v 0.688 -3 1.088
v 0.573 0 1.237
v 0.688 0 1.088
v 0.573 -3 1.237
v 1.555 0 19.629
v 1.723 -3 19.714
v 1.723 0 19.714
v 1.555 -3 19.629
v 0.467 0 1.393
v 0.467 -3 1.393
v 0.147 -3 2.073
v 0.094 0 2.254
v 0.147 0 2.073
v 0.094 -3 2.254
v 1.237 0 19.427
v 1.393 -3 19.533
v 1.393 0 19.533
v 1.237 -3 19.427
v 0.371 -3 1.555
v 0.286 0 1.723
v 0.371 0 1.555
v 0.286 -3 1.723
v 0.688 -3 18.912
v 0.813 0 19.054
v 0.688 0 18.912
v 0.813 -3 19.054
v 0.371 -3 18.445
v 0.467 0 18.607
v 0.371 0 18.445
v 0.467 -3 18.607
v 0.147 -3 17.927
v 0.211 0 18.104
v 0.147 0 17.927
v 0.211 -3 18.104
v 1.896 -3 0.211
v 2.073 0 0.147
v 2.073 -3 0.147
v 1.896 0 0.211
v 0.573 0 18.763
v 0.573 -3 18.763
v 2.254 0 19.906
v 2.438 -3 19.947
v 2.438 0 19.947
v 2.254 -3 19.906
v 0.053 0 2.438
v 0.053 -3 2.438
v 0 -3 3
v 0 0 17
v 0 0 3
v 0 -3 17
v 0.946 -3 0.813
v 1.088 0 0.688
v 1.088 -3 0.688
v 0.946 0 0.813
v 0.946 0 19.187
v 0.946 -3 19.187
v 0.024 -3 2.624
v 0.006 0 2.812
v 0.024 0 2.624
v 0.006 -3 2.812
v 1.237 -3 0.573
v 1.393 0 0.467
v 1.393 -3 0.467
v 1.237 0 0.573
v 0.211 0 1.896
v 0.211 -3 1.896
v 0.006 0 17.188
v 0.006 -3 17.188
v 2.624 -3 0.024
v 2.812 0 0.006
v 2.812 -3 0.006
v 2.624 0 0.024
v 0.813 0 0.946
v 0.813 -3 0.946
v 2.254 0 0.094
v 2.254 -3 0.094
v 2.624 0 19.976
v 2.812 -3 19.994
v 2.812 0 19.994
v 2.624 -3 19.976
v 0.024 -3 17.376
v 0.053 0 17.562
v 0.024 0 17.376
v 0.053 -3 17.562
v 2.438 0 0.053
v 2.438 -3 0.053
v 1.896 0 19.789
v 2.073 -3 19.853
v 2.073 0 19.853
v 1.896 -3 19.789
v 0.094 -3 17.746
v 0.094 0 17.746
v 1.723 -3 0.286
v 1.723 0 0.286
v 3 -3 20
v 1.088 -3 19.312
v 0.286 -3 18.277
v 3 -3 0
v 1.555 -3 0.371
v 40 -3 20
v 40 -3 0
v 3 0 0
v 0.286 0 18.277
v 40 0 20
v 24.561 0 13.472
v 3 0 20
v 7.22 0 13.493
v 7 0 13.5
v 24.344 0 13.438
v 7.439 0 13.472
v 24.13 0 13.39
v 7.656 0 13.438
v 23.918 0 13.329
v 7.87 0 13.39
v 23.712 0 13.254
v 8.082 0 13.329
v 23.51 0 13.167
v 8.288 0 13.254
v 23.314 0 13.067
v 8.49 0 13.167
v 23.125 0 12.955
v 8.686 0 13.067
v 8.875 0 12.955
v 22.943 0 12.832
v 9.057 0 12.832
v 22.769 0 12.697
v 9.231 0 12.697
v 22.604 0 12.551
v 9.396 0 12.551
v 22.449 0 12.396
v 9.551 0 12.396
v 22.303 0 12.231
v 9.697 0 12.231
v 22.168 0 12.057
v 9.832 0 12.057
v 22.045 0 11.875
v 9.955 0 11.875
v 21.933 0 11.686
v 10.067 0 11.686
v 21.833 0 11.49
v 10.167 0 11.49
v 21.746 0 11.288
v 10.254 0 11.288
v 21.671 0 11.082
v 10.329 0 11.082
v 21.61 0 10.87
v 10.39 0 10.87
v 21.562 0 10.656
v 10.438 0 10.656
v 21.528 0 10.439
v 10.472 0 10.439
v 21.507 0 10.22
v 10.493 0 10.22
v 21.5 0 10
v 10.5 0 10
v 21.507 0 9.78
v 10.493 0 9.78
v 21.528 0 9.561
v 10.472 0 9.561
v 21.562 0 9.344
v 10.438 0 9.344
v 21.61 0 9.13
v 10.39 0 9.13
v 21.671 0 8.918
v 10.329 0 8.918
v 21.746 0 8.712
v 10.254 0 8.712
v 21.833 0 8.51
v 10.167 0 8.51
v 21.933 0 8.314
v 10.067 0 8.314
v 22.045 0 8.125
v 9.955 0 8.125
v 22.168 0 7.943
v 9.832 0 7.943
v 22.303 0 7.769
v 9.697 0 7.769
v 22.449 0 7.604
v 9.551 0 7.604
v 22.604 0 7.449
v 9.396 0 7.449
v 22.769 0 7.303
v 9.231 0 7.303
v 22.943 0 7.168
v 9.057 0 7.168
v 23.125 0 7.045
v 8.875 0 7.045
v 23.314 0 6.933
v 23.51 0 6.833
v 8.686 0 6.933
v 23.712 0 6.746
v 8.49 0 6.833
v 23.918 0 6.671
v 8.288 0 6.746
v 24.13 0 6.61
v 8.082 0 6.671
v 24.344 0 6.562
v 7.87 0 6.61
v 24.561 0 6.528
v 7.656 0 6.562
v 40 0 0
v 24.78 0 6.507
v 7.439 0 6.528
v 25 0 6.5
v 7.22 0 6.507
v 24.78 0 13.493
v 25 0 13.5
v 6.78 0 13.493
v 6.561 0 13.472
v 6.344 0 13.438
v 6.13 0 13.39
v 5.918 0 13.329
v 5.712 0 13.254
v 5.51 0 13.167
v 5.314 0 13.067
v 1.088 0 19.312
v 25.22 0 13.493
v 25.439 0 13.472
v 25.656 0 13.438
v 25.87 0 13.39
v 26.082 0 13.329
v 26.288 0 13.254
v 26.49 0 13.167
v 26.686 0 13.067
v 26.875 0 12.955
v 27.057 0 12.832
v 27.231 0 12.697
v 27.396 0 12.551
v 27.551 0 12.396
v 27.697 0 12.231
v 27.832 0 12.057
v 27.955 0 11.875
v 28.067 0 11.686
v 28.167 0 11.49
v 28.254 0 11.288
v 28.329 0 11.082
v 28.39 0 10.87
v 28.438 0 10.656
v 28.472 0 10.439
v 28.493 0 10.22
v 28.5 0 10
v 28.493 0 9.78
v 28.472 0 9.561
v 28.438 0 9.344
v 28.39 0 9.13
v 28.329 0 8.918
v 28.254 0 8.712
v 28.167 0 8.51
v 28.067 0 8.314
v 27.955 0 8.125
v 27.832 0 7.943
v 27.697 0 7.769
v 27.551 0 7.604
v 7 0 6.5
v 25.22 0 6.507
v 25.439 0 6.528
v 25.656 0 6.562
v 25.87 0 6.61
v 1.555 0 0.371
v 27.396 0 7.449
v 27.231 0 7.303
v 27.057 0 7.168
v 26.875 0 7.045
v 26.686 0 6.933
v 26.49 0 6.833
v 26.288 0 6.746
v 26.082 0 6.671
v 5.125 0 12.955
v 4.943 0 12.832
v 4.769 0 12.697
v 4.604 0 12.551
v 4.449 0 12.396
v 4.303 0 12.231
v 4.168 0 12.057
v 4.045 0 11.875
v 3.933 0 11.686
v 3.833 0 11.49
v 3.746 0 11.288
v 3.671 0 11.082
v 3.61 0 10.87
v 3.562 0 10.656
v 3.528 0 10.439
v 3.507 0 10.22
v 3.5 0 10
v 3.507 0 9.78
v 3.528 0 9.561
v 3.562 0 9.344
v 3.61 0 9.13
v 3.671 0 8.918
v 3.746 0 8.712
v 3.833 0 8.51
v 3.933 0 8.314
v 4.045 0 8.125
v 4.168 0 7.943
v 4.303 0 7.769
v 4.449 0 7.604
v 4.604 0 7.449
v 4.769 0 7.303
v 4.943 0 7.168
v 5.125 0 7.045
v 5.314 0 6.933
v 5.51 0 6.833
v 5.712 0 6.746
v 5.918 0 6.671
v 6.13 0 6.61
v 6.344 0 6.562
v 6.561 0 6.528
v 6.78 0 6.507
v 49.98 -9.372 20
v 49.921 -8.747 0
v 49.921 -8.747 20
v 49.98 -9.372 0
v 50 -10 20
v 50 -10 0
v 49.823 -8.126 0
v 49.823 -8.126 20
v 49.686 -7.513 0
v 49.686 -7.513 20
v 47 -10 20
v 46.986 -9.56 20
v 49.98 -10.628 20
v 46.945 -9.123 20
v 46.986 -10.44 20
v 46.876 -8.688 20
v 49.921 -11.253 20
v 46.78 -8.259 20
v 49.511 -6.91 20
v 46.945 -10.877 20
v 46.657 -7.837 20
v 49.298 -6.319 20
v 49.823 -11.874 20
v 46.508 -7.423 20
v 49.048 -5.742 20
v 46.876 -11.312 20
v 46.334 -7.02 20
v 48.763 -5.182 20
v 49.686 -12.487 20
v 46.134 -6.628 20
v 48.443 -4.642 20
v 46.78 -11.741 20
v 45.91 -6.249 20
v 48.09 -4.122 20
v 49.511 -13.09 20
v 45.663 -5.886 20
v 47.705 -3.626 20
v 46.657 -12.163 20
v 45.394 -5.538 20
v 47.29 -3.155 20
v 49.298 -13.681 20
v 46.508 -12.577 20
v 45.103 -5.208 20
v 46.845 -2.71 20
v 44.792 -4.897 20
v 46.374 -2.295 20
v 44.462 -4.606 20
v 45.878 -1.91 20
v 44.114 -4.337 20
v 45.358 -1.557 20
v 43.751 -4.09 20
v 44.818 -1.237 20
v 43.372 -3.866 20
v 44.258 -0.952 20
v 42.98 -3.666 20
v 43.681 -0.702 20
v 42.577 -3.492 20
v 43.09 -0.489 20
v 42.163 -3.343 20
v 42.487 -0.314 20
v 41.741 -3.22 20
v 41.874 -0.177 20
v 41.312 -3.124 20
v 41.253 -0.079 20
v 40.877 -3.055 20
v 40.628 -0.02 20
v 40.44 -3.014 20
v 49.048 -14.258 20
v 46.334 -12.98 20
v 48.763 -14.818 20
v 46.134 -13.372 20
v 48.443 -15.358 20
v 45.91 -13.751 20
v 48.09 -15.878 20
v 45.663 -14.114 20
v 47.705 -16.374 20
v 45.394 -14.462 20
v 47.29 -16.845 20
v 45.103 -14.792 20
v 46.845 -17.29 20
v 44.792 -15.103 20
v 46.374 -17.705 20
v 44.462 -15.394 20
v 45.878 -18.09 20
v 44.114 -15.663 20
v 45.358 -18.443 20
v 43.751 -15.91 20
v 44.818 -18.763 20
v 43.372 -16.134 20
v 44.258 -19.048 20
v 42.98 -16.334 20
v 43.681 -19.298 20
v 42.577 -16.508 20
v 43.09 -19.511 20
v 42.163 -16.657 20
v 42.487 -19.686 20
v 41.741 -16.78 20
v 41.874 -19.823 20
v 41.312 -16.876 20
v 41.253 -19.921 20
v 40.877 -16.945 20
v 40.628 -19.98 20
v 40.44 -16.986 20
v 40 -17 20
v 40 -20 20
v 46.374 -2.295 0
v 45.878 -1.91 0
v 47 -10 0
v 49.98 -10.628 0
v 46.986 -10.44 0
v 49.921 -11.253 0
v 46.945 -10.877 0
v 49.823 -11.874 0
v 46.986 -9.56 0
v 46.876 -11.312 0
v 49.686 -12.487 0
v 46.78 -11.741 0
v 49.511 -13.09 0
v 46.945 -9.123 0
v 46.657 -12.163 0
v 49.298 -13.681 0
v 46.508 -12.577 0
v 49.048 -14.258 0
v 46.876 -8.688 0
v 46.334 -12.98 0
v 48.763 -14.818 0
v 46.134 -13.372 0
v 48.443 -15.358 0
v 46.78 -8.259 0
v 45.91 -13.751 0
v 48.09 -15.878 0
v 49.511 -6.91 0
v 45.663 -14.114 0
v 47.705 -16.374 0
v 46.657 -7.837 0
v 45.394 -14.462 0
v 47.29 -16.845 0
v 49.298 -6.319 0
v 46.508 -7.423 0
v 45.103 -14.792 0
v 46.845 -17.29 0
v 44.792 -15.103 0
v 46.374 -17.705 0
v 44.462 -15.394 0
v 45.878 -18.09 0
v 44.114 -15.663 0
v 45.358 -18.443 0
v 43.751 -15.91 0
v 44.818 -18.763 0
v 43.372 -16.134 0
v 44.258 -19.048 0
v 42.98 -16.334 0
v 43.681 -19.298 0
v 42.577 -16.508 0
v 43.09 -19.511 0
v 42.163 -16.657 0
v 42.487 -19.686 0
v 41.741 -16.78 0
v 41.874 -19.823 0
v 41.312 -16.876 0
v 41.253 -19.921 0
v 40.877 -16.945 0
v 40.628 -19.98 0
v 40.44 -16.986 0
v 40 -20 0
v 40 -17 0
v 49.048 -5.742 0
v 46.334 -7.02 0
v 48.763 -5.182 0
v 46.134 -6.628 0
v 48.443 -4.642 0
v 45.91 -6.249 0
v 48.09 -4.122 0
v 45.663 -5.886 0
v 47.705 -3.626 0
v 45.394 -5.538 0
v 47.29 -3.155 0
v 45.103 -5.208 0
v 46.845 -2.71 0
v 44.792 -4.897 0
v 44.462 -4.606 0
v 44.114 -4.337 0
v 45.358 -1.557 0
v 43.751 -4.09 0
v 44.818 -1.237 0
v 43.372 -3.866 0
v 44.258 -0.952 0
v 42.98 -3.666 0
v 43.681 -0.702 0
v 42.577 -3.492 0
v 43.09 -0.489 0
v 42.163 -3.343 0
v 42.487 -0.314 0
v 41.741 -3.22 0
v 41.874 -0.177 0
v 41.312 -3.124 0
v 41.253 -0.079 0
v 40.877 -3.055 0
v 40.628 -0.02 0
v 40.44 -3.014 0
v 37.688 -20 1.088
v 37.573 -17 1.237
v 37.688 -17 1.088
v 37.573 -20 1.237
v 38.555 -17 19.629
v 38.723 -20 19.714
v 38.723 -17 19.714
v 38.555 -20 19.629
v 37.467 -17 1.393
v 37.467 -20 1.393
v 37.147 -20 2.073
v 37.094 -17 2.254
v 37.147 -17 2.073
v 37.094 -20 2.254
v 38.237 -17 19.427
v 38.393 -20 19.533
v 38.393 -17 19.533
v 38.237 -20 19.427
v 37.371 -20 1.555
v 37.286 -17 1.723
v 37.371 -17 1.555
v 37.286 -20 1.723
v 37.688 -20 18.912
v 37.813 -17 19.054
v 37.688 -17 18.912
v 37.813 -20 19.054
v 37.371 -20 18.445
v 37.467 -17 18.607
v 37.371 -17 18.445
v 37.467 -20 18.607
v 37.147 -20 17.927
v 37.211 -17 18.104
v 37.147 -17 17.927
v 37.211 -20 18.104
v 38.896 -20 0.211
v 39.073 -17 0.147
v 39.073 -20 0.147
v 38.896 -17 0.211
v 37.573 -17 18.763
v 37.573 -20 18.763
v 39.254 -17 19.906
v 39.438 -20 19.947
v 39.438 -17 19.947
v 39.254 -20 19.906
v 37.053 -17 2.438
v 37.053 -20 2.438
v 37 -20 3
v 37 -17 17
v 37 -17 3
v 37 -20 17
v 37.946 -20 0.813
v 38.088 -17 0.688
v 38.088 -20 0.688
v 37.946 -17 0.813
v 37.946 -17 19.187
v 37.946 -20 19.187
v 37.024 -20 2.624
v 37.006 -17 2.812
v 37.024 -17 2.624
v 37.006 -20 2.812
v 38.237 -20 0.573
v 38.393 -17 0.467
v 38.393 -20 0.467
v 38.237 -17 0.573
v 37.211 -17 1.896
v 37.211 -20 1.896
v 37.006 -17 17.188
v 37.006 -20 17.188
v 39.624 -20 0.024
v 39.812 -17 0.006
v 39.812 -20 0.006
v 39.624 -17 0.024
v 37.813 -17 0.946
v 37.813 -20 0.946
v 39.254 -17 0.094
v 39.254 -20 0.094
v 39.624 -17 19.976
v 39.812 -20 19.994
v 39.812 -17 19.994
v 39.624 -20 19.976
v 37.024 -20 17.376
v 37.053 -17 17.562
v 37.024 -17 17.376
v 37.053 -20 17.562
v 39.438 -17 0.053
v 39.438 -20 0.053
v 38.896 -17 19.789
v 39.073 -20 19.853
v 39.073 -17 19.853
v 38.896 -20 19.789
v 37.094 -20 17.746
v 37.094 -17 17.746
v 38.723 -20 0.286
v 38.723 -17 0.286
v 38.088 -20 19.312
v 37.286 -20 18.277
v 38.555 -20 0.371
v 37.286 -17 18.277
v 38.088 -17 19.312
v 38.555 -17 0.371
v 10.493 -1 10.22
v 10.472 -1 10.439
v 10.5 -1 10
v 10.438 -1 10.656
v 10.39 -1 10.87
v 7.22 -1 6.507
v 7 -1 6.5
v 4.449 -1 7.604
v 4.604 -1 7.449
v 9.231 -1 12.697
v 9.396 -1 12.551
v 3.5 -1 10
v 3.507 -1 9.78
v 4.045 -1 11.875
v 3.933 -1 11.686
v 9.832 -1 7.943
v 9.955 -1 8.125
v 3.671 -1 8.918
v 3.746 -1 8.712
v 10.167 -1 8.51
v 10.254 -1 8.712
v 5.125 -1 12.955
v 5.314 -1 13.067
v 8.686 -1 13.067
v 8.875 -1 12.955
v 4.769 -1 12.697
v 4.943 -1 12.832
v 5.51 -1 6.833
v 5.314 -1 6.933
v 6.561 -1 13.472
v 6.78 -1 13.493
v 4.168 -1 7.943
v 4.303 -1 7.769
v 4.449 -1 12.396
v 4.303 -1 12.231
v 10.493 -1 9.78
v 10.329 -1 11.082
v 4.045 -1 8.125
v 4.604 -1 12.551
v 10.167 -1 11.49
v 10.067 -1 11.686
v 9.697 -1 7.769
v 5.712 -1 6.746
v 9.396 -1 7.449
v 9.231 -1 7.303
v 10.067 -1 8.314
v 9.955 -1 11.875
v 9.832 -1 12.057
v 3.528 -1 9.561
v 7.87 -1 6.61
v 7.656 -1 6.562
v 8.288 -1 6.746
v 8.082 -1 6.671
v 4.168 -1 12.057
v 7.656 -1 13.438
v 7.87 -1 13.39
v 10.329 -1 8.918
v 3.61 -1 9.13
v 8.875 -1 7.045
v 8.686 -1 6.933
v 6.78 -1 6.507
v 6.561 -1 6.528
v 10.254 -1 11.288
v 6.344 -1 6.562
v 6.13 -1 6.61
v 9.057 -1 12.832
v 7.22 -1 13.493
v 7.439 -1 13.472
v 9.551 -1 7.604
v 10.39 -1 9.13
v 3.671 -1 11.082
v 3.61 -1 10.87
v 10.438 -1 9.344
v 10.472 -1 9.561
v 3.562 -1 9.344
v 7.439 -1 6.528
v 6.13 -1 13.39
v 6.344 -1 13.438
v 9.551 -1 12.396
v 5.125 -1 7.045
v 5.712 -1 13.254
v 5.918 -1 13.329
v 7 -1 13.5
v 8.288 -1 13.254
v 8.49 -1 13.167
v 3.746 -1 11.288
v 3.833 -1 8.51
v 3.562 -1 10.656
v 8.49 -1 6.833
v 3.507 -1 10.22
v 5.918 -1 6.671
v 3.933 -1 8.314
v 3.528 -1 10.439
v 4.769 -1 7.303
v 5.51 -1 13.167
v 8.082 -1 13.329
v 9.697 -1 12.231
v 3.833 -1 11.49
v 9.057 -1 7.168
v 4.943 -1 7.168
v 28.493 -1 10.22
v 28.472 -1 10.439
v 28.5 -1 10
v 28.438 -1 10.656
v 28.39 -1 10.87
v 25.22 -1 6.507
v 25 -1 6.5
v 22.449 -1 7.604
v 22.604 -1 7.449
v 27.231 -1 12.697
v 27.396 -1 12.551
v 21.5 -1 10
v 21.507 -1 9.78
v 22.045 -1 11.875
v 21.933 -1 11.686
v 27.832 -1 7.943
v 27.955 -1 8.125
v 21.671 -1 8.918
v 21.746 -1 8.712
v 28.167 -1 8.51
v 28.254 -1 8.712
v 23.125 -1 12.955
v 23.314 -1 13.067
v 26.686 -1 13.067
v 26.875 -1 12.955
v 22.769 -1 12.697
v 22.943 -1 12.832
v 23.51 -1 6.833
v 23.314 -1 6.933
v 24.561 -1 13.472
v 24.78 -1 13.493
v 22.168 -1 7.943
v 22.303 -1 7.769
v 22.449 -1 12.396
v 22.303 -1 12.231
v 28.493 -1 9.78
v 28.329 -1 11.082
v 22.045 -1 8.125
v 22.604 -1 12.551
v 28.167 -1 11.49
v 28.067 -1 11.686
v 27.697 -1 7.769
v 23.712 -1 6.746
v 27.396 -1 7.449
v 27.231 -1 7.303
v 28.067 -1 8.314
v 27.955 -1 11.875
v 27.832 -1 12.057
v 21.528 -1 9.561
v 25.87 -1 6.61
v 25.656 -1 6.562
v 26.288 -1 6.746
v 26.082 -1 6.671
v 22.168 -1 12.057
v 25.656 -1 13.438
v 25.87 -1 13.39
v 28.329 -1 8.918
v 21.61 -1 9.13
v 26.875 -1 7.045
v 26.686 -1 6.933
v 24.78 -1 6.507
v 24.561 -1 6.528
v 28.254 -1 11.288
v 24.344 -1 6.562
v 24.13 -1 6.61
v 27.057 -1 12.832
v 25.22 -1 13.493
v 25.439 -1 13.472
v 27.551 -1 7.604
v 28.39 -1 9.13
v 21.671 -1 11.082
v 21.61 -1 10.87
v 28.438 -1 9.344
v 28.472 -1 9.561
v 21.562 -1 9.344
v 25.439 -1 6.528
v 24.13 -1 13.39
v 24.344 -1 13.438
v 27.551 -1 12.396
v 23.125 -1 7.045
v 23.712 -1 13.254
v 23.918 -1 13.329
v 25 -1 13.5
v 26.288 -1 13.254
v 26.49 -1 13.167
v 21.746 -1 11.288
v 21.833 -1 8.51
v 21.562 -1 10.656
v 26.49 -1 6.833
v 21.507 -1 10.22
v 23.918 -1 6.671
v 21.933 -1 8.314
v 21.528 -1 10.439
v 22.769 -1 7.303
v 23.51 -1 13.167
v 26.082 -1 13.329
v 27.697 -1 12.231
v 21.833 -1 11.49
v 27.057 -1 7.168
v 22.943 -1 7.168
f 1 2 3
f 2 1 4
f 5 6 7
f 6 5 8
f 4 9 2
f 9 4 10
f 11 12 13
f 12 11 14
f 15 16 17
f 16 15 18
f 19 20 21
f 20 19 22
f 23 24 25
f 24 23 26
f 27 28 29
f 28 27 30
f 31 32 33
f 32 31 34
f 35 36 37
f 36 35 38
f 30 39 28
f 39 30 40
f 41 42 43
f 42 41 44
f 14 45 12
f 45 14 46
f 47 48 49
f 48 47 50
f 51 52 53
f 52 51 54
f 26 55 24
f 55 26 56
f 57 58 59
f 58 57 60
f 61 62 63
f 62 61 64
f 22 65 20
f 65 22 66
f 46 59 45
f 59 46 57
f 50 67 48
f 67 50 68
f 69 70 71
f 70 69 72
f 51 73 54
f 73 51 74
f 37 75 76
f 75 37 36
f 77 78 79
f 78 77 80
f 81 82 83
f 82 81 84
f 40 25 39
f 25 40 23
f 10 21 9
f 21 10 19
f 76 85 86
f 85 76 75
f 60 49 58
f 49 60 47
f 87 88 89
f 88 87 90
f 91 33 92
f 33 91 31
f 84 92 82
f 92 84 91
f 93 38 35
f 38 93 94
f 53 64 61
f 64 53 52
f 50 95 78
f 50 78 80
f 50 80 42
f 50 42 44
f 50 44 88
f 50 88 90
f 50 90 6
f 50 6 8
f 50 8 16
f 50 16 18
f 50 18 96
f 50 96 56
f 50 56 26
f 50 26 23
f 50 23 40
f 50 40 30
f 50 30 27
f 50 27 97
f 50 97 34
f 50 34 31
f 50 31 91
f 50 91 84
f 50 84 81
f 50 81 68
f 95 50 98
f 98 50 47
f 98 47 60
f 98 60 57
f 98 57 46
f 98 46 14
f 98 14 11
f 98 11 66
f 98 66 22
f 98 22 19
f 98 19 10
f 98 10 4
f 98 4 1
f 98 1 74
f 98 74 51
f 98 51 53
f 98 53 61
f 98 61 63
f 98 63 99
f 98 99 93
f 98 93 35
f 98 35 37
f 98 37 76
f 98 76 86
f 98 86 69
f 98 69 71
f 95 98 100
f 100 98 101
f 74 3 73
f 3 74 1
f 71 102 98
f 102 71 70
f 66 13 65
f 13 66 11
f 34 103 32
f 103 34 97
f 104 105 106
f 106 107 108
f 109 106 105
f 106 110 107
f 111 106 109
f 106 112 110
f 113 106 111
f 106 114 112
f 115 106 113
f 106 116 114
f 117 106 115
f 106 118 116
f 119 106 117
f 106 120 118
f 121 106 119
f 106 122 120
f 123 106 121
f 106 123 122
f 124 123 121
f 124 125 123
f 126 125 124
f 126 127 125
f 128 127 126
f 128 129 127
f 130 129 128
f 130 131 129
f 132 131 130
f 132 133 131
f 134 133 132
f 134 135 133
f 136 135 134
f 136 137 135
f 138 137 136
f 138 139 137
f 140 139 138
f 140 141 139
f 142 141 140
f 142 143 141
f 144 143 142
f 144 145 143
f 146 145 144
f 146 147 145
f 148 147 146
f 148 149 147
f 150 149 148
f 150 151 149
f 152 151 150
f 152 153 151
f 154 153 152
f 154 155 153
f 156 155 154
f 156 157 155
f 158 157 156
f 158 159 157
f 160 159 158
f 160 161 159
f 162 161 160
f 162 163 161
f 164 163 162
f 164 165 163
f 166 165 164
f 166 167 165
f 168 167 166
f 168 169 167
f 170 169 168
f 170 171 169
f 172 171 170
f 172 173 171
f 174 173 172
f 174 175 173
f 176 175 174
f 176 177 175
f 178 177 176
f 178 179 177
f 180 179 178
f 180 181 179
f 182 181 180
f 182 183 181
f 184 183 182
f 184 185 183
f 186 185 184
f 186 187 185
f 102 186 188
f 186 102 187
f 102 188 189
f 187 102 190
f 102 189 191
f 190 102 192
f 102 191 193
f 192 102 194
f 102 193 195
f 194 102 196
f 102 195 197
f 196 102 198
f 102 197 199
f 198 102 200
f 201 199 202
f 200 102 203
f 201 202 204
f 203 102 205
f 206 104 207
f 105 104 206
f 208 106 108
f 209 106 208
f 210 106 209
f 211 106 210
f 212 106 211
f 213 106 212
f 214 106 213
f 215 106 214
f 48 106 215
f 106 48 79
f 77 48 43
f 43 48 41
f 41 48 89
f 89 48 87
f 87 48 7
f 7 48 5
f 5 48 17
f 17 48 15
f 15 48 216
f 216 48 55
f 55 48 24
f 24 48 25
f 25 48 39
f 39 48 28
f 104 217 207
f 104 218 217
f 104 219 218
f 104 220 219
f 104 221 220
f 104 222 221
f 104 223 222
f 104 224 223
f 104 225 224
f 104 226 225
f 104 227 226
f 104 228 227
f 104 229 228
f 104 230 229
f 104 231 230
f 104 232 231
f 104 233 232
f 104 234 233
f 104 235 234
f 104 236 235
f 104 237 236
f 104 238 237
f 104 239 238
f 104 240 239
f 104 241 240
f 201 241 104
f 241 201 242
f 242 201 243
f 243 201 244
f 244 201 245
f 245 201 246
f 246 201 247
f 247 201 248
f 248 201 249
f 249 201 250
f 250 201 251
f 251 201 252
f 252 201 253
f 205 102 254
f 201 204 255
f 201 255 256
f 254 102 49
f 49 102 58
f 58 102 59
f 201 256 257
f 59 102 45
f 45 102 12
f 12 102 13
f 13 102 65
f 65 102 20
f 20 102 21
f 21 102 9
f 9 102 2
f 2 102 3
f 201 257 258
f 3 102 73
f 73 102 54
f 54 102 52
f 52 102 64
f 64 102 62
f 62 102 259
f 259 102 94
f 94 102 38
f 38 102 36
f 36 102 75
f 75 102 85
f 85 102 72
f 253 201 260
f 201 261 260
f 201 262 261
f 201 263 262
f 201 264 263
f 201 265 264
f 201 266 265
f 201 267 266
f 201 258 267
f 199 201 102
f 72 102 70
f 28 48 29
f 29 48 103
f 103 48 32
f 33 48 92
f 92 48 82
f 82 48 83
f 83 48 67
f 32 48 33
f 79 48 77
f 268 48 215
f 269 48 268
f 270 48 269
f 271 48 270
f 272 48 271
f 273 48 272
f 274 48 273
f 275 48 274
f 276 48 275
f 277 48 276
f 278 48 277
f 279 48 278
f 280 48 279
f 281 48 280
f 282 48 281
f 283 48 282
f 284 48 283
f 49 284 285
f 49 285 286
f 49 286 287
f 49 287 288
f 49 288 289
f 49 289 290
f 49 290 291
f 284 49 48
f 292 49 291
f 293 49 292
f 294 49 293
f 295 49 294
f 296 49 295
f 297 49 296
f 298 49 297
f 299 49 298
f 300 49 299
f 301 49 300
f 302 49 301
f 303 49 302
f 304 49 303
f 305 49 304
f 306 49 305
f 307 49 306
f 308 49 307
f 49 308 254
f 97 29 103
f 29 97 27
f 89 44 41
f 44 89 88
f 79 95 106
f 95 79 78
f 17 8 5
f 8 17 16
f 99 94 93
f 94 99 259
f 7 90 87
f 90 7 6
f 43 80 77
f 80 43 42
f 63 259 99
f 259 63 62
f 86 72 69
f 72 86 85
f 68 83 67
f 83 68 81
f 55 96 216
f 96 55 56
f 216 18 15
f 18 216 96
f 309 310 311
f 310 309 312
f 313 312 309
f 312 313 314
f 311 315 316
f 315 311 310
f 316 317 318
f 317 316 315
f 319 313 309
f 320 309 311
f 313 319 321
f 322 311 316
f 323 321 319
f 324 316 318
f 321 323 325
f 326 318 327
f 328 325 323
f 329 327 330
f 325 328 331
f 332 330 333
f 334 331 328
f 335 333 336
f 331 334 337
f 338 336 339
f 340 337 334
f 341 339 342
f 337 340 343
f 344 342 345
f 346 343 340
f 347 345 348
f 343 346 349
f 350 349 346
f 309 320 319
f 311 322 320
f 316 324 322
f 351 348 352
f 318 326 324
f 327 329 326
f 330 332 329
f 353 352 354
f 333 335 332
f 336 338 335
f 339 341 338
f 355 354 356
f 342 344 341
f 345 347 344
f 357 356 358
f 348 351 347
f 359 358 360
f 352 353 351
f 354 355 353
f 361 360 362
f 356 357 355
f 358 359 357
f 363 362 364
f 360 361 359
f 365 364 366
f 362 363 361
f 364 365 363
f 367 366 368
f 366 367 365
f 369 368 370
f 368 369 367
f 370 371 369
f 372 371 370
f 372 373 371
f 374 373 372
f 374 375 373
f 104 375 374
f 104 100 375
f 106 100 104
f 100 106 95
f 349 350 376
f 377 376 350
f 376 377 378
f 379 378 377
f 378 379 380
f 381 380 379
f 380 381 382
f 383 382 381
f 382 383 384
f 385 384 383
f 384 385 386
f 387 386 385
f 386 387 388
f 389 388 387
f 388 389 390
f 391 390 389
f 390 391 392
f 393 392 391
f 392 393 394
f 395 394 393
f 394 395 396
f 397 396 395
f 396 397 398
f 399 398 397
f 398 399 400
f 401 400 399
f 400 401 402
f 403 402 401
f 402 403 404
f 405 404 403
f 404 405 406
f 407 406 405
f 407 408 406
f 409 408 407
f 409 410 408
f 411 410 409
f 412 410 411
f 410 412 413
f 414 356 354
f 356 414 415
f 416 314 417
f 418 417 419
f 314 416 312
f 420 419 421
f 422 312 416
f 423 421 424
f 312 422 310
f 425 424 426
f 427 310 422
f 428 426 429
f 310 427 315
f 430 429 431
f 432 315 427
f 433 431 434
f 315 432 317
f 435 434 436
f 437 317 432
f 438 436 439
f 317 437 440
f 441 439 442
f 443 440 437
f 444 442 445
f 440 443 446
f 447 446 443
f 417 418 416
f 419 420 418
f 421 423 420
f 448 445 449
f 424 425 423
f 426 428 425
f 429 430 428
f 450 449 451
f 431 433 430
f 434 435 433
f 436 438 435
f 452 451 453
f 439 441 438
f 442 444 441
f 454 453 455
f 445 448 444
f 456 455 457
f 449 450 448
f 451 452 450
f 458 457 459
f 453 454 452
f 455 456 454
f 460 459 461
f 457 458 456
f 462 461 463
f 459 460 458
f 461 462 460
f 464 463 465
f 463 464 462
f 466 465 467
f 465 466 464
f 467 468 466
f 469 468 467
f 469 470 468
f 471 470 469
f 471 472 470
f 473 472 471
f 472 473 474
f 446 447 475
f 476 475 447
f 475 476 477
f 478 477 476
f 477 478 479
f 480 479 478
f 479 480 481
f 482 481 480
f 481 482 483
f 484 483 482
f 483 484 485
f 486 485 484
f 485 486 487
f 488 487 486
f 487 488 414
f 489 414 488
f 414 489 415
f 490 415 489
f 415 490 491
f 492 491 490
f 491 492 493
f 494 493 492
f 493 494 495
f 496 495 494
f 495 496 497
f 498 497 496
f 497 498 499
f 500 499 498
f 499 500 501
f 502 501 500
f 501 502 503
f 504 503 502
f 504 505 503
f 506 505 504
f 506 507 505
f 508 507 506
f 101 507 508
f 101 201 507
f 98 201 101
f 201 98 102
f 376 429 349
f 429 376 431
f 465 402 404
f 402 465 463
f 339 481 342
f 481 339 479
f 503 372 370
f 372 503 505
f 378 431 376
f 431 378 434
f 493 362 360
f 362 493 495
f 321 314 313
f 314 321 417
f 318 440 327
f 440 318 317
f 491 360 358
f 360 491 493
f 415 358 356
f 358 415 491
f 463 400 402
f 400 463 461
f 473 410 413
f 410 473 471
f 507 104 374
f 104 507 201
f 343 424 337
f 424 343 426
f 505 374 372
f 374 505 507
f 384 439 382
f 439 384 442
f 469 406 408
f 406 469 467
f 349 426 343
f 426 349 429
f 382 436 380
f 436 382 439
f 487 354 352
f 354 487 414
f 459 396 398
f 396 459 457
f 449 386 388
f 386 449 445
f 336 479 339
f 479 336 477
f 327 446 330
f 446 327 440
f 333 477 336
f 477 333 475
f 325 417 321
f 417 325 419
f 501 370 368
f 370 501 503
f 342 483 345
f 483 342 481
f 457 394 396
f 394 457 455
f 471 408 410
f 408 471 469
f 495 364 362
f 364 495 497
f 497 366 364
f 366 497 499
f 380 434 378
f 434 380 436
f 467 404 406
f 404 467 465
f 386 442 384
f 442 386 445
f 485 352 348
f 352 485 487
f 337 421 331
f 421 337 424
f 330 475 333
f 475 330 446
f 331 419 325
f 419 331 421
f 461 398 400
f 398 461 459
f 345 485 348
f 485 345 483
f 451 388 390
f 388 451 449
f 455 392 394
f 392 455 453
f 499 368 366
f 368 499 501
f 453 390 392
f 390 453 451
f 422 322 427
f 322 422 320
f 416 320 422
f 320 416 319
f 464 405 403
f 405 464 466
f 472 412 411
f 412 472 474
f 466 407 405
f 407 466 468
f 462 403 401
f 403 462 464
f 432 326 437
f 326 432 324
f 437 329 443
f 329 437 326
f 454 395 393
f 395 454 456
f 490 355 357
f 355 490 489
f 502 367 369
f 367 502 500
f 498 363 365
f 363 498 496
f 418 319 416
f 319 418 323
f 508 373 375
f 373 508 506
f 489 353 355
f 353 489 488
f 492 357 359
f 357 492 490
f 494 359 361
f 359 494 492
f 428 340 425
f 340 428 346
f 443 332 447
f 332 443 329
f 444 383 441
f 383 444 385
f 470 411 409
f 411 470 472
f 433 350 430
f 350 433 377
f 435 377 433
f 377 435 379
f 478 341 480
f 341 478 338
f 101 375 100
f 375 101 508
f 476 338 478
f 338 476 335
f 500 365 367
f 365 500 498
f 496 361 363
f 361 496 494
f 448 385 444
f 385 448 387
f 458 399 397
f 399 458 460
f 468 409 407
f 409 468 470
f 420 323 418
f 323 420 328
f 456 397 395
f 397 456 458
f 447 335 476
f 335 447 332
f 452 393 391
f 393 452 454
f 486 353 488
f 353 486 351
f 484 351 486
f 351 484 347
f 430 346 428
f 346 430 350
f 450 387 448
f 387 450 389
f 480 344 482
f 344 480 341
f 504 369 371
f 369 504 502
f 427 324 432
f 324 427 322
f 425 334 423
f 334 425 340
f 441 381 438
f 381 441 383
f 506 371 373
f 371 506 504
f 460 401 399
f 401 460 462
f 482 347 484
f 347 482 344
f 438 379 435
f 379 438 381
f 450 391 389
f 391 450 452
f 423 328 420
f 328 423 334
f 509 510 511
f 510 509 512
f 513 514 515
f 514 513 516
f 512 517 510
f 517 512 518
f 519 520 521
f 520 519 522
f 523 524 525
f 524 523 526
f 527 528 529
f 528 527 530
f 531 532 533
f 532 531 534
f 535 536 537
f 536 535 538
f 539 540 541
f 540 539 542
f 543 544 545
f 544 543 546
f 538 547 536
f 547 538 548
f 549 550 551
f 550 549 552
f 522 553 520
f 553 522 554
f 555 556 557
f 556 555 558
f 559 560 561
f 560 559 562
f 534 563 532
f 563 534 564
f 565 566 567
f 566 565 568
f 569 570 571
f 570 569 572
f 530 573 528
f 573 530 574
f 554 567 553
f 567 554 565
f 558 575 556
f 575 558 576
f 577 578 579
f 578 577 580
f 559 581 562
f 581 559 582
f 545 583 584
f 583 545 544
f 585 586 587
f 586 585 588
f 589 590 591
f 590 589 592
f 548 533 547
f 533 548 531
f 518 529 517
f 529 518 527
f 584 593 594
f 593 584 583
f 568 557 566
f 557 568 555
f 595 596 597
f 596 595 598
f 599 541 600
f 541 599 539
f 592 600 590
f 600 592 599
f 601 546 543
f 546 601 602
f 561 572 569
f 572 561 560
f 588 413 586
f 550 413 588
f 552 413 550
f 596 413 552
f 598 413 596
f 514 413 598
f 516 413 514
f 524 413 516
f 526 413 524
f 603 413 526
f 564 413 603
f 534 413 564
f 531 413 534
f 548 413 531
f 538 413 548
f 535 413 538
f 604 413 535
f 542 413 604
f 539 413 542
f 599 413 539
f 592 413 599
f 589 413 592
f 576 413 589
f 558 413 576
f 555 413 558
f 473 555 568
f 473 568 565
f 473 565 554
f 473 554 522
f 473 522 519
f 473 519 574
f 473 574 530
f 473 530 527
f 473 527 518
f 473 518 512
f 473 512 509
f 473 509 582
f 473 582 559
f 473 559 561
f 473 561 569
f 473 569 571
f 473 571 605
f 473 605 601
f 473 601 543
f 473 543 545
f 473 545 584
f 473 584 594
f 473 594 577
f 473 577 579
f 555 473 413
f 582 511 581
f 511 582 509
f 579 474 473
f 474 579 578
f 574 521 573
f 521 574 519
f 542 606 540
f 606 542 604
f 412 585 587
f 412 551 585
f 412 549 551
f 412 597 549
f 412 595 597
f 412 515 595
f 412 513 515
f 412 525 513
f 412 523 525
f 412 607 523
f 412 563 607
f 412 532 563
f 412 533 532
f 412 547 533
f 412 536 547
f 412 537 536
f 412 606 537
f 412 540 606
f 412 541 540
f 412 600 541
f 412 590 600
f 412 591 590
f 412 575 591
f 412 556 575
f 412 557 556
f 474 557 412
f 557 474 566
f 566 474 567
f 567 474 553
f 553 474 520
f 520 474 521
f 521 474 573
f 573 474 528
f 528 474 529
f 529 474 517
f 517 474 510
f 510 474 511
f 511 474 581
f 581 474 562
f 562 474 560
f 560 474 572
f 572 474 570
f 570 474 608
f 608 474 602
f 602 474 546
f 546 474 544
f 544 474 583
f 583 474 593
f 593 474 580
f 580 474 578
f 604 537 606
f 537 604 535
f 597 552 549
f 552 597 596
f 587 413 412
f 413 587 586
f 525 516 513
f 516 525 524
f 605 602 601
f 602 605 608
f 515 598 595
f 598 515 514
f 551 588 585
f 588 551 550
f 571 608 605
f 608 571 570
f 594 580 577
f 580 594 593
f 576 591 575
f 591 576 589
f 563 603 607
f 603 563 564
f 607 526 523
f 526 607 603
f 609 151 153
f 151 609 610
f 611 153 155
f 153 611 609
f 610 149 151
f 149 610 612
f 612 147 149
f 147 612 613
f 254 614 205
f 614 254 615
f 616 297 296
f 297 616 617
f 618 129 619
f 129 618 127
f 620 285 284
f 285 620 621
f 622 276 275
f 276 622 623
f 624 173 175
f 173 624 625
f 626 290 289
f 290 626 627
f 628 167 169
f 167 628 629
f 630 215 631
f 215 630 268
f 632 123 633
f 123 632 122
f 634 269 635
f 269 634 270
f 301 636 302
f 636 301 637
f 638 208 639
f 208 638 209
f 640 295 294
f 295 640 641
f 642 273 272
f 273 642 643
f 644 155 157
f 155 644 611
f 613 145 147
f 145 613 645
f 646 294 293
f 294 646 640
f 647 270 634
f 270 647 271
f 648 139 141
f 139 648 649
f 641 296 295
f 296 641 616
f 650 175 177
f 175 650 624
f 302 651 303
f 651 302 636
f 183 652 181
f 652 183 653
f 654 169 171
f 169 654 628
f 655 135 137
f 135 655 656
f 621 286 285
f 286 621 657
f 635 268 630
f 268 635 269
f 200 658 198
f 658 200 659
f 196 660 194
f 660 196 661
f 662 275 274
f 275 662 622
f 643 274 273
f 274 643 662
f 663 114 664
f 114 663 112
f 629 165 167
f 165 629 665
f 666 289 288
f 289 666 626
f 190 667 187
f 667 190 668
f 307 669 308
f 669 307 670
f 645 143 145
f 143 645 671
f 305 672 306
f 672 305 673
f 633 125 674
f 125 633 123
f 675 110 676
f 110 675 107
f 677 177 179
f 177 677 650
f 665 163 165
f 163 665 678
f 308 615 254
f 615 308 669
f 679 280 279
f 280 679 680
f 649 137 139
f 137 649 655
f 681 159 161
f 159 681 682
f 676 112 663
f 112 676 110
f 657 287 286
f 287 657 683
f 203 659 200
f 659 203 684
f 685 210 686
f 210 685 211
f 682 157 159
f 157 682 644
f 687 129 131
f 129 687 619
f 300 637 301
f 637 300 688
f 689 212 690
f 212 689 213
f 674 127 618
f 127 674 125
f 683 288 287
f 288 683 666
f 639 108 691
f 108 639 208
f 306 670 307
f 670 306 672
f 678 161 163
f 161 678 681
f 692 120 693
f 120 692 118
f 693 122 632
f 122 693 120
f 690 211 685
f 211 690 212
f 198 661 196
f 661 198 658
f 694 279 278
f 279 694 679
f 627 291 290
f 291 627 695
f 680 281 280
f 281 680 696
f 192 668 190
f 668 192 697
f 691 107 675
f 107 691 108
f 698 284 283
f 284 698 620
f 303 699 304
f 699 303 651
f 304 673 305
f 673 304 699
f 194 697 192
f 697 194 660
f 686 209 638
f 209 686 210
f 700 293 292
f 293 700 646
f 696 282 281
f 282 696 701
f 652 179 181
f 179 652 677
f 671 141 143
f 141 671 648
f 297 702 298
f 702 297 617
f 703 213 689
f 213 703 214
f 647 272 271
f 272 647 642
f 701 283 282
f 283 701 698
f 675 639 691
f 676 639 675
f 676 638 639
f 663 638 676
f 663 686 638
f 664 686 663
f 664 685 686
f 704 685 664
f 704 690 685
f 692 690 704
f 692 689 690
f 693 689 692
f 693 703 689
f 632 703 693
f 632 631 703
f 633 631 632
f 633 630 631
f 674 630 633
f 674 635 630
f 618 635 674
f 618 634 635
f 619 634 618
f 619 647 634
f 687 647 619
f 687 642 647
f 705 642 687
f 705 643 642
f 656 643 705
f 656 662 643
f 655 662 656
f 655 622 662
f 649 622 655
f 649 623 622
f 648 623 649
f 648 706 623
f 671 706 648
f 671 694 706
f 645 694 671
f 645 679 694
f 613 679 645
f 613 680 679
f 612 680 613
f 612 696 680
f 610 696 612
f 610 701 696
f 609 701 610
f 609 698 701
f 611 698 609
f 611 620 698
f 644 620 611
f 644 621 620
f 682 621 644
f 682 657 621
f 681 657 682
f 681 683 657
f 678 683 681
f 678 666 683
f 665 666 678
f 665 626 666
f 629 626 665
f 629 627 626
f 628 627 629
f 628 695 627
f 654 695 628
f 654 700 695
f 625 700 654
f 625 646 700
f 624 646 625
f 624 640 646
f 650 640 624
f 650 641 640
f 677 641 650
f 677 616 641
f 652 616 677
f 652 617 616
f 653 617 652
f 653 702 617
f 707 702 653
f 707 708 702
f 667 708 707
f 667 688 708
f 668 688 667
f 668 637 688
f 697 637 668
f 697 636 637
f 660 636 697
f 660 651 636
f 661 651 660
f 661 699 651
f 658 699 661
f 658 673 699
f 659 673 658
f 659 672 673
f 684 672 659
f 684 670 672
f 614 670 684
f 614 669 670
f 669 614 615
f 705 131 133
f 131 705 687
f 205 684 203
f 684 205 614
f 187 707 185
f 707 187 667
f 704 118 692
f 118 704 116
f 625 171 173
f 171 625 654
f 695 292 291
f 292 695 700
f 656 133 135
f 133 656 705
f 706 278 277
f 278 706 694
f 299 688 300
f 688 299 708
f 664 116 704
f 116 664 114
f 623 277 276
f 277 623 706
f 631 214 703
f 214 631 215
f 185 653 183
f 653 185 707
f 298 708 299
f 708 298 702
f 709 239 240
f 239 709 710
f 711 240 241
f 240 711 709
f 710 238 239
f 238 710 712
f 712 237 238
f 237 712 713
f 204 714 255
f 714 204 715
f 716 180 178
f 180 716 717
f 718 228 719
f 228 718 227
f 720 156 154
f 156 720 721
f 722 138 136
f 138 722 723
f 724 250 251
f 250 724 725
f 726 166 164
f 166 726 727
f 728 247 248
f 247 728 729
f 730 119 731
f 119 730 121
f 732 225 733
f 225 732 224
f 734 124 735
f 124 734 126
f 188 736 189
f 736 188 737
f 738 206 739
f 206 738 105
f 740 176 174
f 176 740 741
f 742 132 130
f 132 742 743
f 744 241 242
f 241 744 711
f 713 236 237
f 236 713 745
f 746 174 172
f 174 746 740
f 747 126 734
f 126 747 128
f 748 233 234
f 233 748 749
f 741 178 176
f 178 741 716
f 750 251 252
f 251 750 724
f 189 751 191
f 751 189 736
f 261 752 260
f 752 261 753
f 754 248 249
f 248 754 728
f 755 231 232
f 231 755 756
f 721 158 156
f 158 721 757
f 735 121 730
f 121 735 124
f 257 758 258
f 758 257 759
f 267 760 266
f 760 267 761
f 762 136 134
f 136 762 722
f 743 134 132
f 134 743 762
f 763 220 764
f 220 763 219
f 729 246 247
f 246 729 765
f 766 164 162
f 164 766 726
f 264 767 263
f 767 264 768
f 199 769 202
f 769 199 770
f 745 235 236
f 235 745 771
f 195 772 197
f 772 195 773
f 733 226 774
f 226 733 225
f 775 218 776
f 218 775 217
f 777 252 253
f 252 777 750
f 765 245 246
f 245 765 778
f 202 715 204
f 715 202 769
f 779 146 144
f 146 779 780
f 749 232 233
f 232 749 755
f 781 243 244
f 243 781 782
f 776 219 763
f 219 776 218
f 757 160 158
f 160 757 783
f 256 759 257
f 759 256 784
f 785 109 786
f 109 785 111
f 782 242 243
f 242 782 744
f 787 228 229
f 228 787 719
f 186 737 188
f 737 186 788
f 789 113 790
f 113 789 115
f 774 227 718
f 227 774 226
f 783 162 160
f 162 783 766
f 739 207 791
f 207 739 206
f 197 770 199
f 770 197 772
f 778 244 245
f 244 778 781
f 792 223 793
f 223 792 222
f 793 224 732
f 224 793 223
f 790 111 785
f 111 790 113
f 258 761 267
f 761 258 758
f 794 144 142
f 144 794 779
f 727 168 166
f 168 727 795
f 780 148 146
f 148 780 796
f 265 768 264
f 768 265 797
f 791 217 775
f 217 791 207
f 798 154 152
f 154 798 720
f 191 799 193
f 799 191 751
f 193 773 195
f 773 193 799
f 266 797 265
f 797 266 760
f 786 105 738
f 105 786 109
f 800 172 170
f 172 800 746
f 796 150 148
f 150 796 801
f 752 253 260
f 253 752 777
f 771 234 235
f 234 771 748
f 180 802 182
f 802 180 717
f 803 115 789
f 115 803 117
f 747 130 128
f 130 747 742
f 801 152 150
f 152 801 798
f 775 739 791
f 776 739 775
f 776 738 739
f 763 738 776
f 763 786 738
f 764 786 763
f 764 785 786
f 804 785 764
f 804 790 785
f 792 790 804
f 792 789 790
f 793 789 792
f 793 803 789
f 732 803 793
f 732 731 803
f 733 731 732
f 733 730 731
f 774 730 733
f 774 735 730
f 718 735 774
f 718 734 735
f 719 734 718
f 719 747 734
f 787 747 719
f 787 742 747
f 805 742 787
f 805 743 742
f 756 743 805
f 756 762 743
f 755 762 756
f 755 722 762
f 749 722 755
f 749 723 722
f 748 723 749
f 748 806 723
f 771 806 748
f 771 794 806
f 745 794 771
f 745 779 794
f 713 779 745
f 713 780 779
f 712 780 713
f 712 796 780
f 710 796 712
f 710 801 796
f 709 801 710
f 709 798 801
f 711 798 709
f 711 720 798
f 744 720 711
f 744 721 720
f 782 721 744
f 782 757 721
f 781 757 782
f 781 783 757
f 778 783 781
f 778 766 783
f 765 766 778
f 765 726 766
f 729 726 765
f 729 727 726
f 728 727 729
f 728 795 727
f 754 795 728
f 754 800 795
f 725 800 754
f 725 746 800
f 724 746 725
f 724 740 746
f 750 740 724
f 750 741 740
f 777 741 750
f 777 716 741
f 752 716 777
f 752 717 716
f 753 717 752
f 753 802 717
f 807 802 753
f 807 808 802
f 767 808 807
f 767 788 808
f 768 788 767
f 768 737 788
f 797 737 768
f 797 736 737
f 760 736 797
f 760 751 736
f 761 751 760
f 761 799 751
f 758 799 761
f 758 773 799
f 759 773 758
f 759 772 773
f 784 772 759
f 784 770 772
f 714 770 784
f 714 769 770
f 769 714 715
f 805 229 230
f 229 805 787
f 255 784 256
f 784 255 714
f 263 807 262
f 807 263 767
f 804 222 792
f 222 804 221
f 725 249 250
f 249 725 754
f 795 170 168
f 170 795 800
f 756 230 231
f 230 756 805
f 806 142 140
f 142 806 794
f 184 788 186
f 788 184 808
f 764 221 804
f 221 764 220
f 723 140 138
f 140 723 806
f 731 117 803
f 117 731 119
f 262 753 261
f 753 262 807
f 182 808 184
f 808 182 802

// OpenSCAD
// file: common.scad
// This work is licensed under a Creative Commons Attribution-ShareAlike 4.0 International License (http://creativecommons.org/licenses/by-sa/4.0/)

module xmove(dist) { translate([dist, 0, 0]) children(); }
module ymove(dist) { translate([0, dist, 0]) children(); }
module zmove(dist) { translate([0, 0, dist]) children(); }
module xrot(angle) { rotate([angle, 0, 0]) children(); }
module yrot(angle) { rotate([0, angle, 0]) children(); }
module zrot(angle) { rotate([0, 0, angle]) children(); }
module center(dims) { translate([-dims[0]/2, -dims[1]/2, -dims[2]/2]) children(); }

module _center_by_flag(dimensions, center) {
    if (center) {
        center(dimensions) children();
    } else {
        children();
    }
}

module round_cube(dimensions, radius, center=false) {
    width = dimensions[0];
    depth = dimensions[1];
    height = dimensions[2];
    assert(radius < width/2, "radius should be less than half of x size");
    assert(radius < depth/2, "radius should be less than half of y size")
    _center_by_flag(dimensions, center)
        translate([radius, radius, 0]) 
            linear_extrude(height=height) 
                minkowski() {
                    square([width - radius*2, depth - radius*2]);
                    circle(r=radius);
                }
}

module hollow_cylinder(height, externalDiameter, internalDiameter, thickness, center=false) {
    assert(internalDiameter != undef || thickness != undef, "either internalDiameter or thickness should be passed");
    internalDiameter = internalDiameter == undef ? externalDiameter - 2*thickness : internalDiameter;
    _center_by_flag([0, 0, height], center)
        difference() {
            cylinder(height, d=externalDiameter);
            translate([0, 0, -1]) cylinder(height + 2, d=internalDiameter);
        }
}

module screw_hole(screwDiameter, headDiameter, fullHeight, headHeight) {    
    eps = 1e-4;
    headZ = fullHeight - headHeight;
    union() {
        zmove(-eps) cylinder(h=fullHeight + 2*eps, d=screwDiameter);
        zmove(headZ) cylinder(h=headHeight + eps, d=headDiameter);
    }
}

module cylinder_sector(radius, height, startAngle, endAngle) {
    assert(startAngle >= 0 && startAngle <= 360, "startAngle should be between 0 and 360");
    assert(endAngle >= 0 && endAngle <= 360, "endAngle should be between 0 and 360");
    a = endAngle - startAngle;
    angle = a < 0 ? 360 + a : a;
    echo ("angle = ", angle);
    rotate([0, 0, startAngle]) rotate_extrude(angle=angle) square([radius, height]);
}


$fn=100;

//round_cube(dimensions=[10,10,3], radius=3);
//round_cube(dimensions=[10,10,3], radius=3, center=true);
//hollow_cylinder(height=3, externalDiameter=10, internalDiameter=7);
//hollow_cylinder(height=3, externalDiameter=10, internalDiameter=7, center=true);
//hollow_cylinder(height=3, externalDiameter=10, thickness = 1, center=true);
difference() { cube([10, 10, 3]); translate([5, 5, 0]) screw_hole(screwDiameter=3, headDiameter=6, fullHeight=3, headHeight=1); }
//cylinder_sector(height=3, radius=5, startAngle=60, endAngle=180);
// main file
// This work is licensed under a Creative Commons Attribution-ShareAlike 4.0 International License (http://creativecommons.org/licenses/by-sa/4.0/)

width=20;
height=50;
thickness=3;
firstScrewFromTop=7;
distanceBetweenScrews=18;
hookDiameter=20;

module __customizer_limit__() {}

$fn=100;

use <common.scad>;

module hook() {
    intersection() {
        hollow_cylinder(height=width, externalDiameter=hookDiameter, internalDiameter=hookDiameter - 2 * thickness);
        translate([0, -hookDiameter/2, 0]) cube([hookDiameter/2, hookDiameter, width]);
    }
}

module screw() {
    screw_hole(screwDiameter=4, headDiameter=7, depth=thickness, headDepth=1);
}

module rounding() {
    intersection() {
        round_cube([thickness*2 + 1, width, thickness], thickness);
        cube([thickness, width, thickness]);
    }
}

rotate([90, 0, 0]) difference() {
    union() {
        translate([0, 0, 0]) 
            rounding();
        translate([thickness, 0, 0]) 
            cube([height-thickness-hookDiameter/2, width, thickness], 3);
        translate([height - hookDiameter / 2, 0, hookDiameter / 2]) rotate([-90, 0, 0]) 
            hook();
        translate([height-thickness-hookDiameter/2, 0, hookDiameter-thickness]) 
            rounding();
    }

    translate([firstScrewFromTop, width/2, 0]) screw();
    translate([firstScrewFromTop + distanceBetweenScrews, width/2, 0]) screw();
}
